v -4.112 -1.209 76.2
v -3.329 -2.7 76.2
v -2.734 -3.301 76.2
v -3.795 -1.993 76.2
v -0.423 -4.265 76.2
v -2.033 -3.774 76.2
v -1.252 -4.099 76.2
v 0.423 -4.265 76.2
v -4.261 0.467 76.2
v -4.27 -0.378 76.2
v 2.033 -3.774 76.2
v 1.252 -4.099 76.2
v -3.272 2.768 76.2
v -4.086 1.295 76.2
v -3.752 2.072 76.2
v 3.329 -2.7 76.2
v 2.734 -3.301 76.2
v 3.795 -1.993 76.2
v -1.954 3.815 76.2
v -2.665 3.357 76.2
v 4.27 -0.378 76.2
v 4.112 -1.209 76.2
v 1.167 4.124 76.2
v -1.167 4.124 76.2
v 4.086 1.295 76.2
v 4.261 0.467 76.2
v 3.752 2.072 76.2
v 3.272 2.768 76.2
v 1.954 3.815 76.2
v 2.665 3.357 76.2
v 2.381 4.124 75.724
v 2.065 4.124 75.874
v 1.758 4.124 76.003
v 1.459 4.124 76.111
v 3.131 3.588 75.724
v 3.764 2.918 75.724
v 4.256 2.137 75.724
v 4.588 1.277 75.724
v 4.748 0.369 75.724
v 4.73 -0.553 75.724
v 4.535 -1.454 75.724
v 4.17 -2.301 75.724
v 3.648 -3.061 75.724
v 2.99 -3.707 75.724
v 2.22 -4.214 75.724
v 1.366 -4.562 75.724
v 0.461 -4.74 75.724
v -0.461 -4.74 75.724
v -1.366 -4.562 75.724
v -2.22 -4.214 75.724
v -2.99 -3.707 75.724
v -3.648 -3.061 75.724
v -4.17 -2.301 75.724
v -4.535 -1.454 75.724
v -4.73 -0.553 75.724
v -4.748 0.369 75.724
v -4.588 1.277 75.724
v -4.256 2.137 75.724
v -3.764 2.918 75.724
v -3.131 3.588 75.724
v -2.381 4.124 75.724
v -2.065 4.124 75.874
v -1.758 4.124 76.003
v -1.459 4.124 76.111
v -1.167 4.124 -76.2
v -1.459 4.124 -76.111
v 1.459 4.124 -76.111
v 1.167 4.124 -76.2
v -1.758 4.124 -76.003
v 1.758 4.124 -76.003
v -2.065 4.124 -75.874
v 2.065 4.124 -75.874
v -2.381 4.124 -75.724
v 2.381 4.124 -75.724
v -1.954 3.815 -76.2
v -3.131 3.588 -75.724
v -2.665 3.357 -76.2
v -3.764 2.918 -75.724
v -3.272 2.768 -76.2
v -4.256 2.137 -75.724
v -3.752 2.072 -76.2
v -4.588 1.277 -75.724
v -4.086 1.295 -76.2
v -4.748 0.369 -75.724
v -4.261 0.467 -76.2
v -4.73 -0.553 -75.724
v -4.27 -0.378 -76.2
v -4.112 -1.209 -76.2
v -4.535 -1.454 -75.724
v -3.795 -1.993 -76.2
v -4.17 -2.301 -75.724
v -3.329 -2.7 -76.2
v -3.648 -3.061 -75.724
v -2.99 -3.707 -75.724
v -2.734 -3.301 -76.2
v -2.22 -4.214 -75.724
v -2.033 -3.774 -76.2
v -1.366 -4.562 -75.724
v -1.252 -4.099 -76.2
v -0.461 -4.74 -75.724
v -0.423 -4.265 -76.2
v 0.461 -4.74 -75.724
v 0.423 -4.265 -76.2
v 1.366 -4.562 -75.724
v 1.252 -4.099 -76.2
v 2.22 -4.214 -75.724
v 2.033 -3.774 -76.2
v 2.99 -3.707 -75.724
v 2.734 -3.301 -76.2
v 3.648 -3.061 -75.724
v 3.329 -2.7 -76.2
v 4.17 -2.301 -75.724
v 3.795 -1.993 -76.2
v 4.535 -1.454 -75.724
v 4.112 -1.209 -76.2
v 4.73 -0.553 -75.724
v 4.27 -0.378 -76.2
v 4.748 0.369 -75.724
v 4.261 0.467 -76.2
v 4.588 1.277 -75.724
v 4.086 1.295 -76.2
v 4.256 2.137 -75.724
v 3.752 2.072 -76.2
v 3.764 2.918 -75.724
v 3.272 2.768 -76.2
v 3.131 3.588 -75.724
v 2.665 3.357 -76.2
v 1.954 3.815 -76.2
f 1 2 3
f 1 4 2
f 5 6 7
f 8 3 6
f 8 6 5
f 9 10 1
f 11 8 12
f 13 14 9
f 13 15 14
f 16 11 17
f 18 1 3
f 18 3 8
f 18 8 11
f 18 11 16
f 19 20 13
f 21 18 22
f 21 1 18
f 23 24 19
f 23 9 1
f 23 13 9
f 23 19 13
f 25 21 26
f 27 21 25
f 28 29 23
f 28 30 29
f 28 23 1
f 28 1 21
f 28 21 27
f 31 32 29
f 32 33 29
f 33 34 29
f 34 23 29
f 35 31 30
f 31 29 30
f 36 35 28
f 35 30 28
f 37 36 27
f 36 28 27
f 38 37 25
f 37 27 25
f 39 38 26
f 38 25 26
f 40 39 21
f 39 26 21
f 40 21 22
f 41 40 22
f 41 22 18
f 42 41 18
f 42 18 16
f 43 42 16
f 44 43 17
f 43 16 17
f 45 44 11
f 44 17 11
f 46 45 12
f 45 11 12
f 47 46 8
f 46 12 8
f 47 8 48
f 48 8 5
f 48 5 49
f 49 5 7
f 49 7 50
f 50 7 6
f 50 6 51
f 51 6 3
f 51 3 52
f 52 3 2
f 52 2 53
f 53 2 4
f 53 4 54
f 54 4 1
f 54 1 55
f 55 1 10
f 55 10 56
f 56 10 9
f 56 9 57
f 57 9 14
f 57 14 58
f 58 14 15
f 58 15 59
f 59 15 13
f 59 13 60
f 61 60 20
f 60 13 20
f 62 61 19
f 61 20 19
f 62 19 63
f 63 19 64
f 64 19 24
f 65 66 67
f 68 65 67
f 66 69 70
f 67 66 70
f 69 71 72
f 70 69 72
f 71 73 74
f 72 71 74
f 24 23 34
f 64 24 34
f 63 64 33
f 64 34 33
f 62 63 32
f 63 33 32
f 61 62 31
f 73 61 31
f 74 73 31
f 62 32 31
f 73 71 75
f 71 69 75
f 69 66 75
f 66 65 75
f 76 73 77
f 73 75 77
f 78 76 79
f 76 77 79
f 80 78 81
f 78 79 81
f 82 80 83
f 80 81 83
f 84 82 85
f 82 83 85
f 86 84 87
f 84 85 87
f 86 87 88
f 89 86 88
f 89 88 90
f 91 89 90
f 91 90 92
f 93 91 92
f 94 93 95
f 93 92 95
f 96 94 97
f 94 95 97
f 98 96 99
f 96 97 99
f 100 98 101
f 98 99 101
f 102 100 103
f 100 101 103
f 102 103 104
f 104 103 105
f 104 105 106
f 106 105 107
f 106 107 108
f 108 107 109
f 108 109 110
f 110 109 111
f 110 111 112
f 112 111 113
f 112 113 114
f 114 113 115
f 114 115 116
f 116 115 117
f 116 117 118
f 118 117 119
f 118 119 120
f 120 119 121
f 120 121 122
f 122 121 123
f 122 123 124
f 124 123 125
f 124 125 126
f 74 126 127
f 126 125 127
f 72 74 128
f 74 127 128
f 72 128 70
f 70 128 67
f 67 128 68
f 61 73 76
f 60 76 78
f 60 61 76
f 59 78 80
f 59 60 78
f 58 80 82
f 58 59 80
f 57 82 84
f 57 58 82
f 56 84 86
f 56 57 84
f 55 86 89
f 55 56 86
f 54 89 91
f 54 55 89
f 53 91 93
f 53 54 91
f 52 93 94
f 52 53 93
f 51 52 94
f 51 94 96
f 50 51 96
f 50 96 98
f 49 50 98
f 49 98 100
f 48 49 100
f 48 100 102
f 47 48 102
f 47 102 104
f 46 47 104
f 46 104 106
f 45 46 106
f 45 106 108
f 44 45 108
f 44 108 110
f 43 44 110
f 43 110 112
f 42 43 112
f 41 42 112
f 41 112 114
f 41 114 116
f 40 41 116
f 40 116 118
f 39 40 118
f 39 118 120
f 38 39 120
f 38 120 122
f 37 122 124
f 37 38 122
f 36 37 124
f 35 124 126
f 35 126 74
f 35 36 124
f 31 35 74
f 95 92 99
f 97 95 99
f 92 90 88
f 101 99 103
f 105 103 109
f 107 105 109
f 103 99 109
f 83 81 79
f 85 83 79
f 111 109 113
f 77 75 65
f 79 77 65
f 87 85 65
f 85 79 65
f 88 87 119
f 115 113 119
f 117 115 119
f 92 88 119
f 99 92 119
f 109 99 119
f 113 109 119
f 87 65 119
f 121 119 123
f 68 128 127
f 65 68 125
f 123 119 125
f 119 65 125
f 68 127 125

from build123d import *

# Parameters (mm, degrees)
SKETCH3_R                = 4.7625
BOSS_EXTRUDE2_DEPTH      = 76.2
BOSS_EXTRUDE2_DEPTH_BACK = 76.2
CUT_EXTRUDE5_DEPTH       = 77.2
CUT_EXTRUDE5_DEPTH_BACK  = 77.2
CHAMFER1_SIZE            = 0.47625


with BuildPart() as part:
    # Sketch3 → Boss-Extrude2 (new body, two sides)
    with BuildSketch(Plane.XY) as boss_extrude2_sk:
        Circle(SKETCH3_R)
    extrude(amount=BOSS_EXTRUDE2_DEPTH)
    extrude(boss_extrude2_sk.sketch, amount=-BOSS_EXTRUDE2_DEPTH_BACK)

    # Sketch10 → Cut-Extrude5 (cut, two sides)
    with BuildSketch(Plane.XY) as cut_extrude5_sk:
        with BuildLine():
            Line((-2.38125, 4.124445986), (2.38125, 4.124445986))
            ThreePointArc((2.38125, 4.124445986), (0, 4.7625), (-2.38125, 4.124445986))
        make_face()
    extrude(amount=CUT_EXTRUDE5_DEPTH, mode=Mode.SUBTRACT)
    extrude(cut_extrude5_sk.sketch, amount=-CUT_EXTRUDE5_DEPTH_BACK, mode=Mode.SUBTRACT)

    # Chamfer1
    chamfer1_edges = [part.edges().sort_by_distance(p)[0] for p in [
        (0, -4.7625, -76.2),
        (0, -4.7625, 76.2),
    ]]
    chamfer(chamfer1_edges, length=CHAMFER1_SIZE)


solid = part.part
